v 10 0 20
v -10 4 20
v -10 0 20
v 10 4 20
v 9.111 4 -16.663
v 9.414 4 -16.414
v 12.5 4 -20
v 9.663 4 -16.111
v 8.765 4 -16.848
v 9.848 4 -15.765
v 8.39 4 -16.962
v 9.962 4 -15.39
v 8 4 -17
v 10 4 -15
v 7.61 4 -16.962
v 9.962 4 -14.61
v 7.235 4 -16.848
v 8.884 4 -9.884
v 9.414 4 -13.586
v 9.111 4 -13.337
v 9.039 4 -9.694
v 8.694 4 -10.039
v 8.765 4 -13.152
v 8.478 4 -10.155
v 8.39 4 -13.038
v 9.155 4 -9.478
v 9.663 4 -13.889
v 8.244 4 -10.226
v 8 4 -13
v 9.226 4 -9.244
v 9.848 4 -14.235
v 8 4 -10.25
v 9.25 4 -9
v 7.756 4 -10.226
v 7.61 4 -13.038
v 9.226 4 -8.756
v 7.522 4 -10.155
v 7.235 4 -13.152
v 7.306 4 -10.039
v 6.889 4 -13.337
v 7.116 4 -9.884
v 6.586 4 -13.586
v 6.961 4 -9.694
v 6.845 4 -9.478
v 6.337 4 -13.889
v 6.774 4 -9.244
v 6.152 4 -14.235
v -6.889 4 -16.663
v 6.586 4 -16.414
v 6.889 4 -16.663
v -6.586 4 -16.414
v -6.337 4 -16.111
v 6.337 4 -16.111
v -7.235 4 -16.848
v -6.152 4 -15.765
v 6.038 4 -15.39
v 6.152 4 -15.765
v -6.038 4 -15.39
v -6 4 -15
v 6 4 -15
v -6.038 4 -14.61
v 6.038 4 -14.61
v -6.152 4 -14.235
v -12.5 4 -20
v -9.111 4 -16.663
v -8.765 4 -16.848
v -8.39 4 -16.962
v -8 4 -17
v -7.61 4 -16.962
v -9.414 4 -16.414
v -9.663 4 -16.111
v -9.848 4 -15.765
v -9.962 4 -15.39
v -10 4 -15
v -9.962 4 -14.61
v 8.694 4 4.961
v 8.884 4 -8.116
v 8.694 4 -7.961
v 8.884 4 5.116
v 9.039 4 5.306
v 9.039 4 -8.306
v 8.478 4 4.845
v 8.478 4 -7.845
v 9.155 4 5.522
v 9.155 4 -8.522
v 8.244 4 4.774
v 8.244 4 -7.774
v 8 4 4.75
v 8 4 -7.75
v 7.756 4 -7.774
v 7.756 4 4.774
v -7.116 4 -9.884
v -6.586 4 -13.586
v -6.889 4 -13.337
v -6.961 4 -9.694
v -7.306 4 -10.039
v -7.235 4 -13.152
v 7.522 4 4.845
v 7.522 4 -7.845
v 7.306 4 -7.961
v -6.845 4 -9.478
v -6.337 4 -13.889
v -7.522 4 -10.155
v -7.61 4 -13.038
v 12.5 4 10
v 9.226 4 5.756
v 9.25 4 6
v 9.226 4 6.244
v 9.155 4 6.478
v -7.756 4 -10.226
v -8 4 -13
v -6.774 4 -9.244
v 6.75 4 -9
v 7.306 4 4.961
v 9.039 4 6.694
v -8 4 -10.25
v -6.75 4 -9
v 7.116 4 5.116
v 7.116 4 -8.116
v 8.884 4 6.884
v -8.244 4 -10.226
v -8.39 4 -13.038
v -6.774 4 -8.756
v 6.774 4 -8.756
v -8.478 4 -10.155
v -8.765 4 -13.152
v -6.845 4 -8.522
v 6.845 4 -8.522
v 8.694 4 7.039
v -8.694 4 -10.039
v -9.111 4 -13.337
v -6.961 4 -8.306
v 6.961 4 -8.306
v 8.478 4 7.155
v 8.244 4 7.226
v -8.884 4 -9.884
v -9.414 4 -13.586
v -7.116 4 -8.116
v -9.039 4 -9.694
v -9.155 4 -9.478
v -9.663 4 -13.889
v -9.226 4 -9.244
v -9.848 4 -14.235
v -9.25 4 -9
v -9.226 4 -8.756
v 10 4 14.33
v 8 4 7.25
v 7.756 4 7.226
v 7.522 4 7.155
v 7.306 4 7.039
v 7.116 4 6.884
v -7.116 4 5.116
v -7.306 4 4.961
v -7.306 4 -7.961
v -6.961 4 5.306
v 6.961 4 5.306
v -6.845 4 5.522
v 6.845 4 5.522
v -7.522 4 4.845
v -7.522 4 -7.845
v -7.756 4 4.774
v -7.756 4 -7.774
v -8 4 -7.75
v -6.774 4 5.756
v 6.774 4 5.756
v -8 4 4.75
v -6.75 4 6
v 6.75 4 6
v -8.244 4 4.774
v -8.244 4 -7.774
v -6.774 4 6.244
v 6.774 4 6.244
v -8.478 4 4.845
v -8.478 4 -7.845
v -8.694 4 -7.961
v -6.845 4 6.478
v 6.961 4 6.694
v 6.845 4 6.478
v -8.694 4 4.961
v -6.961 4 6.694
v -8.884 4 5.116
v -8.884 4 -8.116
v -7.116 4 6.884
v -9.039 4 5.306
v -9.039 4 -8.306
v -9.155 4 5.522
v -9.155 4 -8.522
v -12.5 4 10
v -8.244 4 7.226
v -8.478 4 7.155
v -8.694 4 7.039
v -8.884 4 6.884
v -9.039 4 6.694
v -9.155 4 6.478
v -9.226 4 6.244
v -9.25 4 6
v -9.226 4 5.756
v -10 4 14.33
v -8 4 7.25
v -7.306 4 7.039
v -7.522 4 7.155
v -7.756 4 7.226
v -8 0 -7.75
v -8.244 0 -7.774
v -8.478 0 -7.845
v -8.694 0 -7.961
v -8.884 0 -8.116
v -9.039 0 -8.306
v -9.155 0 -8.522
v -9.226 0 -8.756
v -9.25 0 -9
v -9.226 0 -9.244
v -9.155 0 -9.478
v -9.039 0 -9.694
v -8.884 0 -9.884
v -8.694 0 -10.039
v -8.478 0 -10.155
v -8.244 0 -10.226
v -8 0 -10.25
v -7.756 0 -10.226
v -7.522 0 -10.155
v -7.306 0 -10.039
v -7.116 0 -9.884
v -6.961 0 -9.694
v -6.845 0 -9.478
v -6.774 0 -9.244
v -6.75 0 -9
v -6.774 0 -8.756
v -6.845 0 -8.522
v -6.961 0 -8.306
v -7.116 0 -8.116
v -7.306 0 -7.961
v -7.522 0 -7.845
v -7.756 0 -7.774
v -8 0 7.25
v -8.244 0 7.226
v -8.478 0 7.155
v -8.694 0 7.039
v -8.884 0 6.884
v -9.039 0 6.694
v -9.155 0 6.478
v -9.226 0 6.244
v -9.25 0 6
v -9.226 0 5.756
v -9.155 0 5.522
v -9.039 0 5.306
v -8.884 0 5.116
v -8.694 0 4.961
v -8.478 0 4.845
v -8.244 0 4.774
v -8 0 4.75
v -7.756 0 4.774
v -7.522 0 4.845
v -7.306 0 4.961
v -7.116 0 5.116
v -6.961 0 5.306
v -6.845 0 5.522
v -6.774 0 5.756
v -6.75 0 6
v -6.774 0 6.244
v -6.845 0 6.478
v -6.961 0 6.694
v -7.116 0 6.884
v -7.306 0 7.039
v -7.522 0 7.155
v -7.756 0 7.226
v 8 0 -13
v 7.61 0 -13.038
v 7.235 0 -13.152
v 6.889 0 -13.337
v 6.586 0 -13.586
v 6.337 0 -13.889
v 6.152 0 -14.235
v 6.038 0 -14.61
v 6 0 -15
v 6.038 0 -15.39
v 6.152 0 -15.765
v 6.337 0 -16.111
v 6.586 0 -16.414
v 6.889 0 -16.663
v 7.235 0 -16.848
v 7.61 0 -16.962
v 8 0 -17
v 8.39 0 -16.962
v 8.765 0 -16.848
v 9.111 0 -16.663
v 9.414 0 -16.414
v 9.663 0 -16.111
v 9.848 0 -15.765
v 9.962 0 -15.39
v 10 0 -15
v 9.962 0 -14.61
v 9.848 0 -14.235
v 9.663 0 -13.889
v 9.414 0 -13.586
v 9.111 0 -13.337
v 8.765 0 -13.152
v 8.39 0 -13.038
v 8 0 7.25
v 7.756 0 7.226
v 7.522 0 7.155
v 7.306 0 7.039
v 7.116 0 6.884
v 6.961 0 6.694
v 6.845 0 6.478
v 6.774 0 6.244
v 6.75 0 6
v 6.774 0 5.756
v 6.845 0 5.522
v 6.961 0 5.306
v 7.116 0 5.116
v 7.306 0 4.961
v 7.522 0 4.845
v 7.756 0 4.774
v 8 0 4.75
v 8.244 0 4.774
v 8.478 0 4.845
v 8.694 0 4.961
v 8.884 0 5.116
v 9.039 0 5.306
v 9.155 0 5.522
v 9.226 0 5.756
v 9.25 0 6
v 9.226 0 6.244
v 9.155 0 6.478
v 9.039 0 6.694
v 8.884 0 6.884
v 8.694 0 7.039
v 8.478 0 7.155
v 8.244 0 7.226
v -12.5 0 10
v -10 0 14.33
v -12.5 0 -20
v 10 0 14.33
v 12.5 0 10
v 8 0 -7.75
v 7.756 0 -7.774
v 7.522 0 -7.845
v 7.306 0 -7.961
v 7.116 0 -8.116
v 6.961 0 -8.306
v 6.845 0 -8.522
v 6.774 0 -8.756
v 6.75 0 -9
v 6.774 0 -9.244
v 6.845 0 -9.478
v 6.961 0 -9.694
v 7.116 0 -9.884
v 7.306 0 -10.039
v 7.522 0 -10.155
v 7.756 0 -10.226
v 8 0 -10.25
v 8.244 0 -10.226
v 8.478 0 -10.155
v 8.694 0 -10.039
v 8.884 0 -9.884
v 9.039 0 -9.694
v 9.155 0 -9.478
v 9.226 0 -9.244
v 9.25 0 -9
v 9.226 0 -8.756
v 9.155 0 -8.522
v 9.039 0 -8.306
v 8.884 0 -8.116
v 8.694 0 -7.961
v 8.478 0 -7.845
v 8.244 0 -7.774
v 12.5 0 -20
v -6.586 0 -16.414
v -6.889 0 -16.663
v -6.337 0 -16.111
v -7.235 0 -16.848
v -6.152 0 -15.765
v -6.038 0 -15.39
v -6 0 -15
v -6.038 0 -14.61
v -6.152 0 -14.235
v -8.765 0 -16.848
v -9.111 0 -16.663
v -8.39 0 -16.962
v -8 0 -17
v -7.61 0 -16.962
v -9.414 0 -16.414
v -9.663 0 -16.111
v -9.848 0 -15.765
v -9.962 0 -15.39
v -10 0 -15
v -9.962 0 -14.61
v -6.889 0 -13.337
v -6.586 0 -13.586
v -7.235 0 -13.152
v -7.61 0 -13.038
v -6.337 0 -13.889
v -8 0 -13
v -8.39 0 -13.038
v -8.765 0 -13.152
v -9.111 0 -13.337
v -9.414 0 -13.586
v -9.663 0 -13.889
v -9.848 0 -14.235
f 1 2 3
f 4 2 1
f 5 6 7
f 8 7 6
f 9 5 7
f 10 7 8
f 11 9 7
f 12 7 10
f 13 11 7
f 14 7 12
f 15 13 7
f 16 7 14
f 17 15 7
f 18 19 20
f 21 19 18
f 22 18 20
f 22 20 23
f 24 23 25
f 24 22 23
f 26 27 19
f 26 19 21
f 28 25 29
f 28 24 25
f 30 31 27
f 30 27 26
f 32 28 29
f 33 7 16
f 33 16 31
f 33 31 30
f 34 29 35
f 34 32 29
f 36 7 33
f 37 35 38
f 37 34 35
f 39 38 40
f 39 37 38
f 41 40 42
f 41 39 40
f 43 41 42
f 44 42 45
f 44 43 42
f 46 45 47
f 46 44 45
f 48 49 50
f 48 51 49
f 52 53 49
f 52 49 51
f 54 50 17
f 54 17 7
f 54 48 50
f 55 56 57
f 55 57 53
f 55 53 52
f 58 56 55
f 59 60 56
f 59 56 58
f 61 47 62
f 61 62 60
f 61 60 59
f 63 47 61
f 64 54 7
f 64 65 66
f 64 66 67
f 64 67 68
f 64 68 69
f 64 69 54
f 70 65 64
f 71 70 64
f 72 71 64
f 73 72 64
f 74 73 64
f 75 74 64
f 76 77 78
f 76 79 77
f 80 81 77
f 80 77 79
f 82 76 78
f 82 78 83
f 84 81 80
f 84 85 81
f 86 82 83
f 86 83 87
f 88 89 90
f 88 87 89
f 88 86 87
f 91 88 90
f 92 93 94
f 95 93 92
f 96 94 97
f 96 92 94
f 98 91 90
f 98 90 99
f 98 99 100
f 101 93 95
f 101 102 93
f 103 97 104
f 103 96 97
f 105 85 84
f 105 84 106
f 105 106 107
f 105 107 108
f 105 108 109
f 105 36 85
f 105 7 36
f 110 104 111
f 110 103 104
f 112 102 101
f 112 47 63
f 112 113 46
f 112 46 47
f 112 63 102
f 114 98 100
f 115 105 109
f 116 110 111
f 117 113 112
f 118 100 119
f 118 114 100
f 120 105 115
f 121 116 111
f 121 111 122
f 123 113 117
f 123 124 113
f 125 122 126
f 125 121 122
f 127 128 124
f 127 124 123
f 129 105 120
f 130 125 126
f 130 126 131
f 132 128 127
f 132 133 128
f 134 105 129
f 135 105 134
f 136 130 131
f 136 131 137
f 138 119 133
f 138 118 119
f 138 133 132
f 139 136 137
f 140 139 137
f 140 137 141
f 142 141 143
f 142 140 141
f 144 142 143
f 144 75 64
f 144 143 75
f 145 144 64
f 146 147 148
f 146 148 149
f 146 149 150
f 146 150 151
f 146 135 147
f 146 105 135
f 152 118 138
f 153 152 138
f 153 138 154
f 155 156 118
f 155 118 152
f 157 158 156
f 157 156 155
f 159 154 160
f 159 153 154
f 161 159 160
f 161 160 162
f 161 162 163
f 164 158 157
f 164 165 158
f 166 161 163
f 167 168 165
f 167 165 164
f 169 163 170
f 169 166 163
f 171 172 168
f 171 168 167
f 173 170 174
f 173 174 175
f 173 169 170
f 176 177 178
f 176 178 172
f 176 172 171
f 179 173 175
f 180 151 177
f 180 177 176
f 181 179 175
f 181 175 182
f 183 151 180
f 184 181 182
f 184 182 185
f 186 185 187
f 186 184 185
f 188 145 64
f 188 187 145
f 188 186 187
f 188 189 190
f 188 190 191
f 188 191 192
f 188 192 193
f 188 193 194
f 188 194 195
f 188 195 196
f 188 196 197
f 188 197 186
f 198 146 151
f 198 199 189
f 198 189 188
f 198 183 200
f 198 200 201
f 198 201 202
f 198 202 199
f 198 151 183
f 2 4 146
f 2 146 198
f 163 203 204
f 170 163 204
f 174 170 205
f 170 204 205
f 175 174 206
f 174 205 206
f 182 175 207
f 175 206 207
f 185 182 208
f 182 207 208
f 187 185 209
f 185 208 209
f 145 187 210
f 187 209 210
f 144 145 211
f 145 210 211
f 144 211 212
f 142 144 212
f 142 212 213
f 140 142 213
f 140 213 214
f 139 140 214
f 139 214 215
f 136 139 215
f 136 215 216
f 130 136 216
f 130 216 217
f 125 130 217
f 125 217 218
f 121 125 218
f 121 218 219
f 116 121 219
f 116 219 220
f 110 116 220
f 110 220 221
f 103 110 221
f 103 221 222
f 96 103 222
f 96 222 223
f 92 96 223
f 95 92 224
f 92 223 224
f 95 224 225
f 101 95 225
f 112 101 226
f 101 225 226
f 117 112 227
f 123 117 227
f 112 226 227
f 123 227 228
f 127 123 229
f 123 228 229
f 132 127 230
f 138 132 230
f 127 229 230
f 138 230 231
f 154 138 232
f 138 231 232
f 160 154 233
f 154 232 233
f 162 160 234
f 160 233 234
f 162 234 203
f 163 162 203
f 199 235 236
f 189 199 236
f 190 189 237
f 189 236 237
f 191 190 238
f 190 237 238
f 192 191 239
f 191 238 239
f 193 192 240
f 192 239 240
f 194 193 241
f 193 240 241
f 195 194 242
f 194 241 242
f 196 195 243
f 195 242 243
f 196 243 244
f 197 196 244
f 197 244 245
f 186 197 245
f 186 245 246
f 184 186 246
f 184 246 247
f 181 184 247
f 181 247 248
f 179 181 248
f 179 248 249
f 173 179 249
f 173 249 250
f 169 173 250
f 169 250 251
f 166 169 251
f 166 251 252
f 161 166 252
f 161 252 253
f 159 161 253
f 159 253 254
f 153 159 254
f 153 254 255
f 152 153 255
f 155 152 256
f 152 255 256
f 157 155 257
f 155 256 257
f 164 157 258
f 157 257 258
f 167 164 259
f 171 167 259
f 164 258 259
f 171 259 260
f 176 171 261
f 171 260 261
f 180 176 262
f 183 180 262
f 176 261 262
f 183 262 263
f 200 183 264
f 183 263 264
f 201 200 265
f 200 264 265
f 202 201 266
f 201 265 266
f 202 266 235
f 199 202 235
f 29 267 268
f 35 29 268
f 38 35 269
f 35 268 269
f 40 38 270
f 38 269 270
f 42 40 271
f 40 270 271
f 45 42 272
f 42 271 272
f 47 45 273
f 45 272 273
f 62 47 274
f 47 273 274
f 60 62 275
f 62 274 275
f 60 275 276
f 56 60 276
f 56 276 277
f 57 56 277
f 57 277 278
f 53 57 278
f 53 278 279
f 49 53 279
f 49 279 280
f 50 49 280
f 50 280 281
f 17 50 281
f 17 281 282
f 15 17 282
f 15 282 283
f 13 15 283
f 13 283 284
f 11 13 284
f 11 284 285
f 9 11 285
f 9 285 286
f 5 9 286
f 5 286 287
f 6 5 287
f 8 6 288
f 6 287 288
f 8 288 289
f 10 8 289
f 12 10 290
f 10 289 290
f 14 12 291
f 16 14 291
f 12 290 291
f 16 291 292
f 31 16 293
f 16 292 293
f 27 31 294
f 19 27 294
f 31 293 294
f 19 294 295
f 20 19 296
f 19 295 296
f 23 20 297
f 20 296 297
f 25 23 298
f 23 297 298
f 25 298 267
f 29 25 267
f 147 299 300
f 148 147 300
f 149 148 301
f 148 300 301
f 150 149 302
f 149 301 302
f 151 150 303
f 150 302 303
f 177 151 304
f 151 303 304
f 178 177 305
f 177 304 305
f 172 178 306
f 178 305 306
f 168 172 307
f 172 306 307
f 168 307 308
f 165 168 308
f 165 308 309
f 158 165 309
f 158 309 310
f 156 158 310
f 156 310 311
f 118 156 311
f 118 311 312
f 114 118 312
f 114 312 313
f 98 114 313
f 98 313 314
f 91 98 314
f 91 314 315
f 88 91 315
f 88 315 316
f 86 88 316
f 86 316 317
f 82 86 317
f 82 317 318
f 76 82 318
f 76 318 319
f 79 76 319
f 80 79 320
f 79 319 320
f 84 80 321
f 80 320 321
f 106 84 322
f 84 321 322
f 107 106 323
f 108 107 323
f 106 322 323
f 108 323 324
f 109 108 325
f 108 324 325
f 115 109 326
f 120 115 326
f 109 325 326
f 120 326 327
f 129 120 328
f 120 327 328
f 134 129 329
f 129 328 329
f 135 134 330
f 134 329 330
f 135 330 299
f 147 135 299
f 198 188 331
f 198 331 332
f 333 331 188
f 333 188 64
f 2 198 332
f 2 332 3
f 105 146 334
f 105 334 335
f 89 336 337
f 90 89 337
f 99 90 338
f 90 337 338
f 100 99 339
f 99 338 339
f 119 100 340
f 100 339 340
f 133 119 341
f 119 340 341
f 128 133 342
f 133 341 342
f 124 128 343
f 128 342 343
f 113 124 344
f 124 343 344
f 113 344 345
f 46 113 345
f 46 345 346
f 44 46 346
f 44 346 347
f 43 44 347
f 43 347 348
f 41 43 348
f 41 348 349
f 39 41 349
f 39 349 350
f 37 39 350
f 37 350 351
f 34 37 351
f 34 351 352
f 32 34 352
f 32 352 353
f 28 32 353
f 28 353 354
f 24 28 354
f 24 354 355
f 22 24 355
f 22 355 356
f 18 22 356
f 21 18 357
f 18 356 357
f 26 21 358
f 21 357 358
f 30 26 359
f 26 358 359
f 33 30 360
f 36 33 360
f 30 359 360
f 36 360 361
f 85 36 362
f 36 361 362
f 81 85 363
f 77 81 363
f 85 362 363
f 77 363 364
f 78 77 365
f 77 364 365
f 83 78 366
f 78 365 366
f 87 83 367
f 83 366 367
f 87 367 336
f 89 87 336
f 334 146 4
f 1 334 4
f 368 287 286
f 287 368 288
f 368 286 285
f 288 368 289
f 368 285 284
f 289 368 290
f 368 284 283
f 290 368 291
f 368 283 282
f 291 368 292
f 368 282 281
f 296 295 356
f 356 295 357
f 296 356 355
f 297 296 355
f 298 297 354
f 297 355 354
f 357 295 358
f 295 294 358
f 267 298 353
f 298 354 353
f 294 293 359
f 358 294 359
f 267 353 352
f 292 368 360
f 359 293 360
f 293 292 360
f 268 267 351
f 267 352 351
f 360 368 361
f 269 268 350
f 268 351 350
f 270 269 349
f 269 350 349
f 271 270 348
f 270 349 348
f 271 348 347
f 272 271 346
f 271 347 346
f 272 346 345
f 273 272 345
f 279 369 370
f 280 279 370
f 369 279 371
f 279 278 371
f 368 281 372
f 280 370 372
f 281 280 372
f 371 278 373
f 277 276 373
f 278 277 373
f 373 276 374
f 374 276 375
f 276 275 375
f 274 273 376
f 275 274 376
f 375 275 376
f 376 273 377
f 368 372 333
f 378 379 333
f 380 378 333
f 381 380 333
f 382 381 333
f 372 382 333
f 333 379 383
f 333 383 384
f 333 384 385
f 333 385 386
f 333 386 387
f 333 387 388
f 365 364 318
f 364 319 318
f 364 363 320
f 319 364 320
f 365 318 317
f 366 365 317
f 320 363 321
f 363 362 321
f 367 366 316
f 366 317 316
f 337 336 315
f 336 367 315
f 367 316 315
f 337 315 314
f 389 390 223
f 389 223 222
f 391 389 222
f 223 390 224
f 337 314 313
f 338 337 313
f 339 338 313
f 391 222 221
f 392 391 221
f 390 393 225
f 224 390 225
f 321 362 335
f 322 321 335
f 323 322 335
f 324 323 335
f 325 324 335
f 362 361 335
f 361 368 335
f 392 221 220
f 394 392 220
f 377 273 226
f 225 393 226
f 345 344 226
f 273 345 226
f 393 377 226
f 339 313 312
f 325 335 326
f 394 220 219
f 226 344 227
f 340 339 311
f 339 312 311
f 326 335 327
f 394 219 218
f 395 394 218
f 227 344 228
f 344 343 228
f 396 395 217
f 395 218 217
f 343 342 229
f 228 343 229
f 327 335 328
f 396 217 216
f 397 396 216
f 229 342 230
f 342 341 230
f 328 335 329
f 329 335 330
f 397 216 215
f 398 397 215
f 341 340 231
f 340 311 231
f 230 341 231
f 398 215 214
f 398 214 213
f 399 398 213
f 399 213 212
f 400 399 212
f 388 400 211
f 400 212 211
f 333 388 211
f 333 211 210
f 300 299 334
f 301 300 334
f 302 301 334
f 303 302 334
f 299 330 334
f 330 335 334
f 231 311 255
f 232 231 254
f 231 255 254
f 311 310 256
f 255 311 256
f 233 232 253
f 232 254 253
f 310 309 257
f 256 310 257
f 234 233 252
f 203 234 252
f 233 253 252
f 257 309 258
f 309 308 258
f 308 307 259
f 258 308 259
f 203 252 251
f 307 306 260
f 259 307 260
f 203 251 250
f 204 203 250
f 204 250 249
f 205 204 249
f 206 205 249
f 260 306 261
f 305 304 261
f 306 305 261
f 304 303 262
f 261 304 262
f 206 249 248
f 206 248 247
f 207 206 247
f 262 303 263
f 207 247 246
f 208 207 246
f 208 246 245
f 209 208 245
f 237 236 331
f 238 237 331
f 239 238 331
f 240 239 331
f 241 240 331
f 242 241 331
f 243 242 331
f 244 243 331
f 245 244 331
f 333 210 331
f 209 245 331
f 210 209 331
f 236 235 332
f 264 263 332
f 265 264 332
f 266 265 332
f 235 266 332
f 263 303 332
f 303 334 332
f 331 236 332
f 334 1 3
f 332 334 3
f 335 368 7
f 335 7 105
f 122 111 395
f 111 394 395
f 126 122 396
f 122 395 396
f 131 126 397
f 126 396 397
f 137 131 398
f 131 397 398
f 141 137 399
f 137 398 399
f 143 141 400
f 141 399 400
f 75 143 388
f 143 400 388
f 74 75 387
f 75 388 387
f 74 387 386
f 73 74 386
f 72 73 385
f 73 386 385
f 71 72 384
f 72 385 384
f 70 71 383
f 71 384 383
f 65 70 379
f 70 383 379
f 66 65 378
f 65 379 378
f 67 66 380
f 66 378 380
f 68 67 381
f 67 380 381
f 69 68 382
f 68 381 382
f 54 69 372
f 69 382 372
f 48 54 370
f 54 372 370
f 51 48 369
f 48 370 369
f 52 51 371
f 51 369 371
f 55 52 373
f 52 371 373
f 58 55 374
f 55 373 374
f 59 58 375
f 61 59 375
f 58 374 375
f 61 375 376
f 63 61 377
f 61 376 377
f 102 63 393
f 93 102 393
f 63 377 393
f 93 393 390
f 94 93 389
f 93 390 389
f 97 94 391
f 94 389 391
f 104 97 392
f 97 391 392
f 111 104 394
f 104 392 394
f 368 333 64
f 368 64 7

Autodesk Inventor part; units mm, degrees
ref_plane "YZ Plane" through (0, 0, 0) normal (1, 0, 0) x (0, 1, 0)
ref_plane "XZ Plane" through (0, 0, 0) normal (0, 1, 0) x (-1, 0, 0)
ref_plane "XY Plane" through (0, 0, 0) normal (0, 0, 1) x (1, 0, 0)
sketch "スケッチ1" plane through (0, 0, 0) normal (0, 1, 0) x (-1, 0, 0)
  line L0 (-12.5, 20) -> (12.5, 20)
  line L1 (12.5, 20) -> (12.5, -20)
  line L2 (12.5, -20) -> (-12.5, -20)
  line L3 (-12.5, -20) -> (-12.5, 20)
  point P0 (0, 0)
  dimension "d0" = 25
  dimension "d2" = 40
  dimension "d3" = 20
  dimension "d4" = 12.5
extrude "押し出し1" add sketch "スケッチ1" along normal blind 4
sketch "スケッチ2" plane through (0, 4, 0) normal (0, 1, 0) x (1, 0, 0)
  line L0 (-12.5, -20) -> (12.5, -20) projected
  line L1 (12.5, -20) -> (12.5, 20) projected
  line L2 (12.5, 20) -> (-12.5, 20) projected
  line L3 (-12.5, 20) -> (-12.5, -20) projected
  line L4 (-12.5, -10) -> (-10, -14.3301)
  line L5 (-10, -14.3301) -> (-10, -20)
  line L6 (10, -14.3301) -> (10, -20)
  line L7 (10, -14.3301) -> (12.5, -10)
  point P0 (0, 0)
  dimension "d7" = 20
  dimension "d9" = 2.5
  dimension "d10" = 30
  dimension "d11" = 150
  dimension "d12" = 30
  dimension "d13" = 150
extrude "押し出し2" cut sketch "スケッチ2" against normal blind 4 contours L5 L4 L3 L2 L1 L7 L6 L0 keep common part
sketch "スケッチ3" plane through (0, 4, 0) normal (0, 1, 0) x (1, 0, 0)
  line L0 (12.5, 20) -> (-12.5, 20) projected
  circle A0 centre (-8, 15) radius 2
  circle A1 centre (8, 15) radius 2
  point P0 (0, 0)
  dimension "d16" = 4
  dimension "d18" = 16
  dimension "d19" = 5
  dimension "d20" = 5
  dimension "d21" = 8
hole "穴1" at (-8, 4, -15) at (8, 4, -15) direction (0, -1, 0) diameter 4 end through all
sketch "スケッチ4" plane through (0, 4, 0) normal (0, 1, 0) x (1, 0, 0)
  circle A0 centre (-8, 15) radius 2 projected
  circle A1 centre (8, 15) radius 2 projected
  circle A2 centre (-8, 9) radius 1.5
  circle A3 centre (8, 9) radius 1.5
  circle A4 centre (-8, -6) radius 1.5
  circle A5 centre (8, -6) radius 1.5
  line L0 (12.5, 20) -> (-12.5, 20) projected
  point P0 (0, 0)
  dimension "d29" = 8
  dimension "d31" = 3
  dimension "d33" = 6
  dimension "d34" = 6
  dimension "d35" = 16
  dimension "d36" = 16
  dimension "d37" = 8
  dimension "d40" = 15
  dimension "d41" = 15
  dimension "d49" = 5
hole "穴2" at (-8, 4, 6) at (-8, 4, -9) at (8, 4, 6) at (8, 4, -9) direction (0, -1, 0) diameter 2.5 end through all
properties part number "Arm_Link_Shim_i"
